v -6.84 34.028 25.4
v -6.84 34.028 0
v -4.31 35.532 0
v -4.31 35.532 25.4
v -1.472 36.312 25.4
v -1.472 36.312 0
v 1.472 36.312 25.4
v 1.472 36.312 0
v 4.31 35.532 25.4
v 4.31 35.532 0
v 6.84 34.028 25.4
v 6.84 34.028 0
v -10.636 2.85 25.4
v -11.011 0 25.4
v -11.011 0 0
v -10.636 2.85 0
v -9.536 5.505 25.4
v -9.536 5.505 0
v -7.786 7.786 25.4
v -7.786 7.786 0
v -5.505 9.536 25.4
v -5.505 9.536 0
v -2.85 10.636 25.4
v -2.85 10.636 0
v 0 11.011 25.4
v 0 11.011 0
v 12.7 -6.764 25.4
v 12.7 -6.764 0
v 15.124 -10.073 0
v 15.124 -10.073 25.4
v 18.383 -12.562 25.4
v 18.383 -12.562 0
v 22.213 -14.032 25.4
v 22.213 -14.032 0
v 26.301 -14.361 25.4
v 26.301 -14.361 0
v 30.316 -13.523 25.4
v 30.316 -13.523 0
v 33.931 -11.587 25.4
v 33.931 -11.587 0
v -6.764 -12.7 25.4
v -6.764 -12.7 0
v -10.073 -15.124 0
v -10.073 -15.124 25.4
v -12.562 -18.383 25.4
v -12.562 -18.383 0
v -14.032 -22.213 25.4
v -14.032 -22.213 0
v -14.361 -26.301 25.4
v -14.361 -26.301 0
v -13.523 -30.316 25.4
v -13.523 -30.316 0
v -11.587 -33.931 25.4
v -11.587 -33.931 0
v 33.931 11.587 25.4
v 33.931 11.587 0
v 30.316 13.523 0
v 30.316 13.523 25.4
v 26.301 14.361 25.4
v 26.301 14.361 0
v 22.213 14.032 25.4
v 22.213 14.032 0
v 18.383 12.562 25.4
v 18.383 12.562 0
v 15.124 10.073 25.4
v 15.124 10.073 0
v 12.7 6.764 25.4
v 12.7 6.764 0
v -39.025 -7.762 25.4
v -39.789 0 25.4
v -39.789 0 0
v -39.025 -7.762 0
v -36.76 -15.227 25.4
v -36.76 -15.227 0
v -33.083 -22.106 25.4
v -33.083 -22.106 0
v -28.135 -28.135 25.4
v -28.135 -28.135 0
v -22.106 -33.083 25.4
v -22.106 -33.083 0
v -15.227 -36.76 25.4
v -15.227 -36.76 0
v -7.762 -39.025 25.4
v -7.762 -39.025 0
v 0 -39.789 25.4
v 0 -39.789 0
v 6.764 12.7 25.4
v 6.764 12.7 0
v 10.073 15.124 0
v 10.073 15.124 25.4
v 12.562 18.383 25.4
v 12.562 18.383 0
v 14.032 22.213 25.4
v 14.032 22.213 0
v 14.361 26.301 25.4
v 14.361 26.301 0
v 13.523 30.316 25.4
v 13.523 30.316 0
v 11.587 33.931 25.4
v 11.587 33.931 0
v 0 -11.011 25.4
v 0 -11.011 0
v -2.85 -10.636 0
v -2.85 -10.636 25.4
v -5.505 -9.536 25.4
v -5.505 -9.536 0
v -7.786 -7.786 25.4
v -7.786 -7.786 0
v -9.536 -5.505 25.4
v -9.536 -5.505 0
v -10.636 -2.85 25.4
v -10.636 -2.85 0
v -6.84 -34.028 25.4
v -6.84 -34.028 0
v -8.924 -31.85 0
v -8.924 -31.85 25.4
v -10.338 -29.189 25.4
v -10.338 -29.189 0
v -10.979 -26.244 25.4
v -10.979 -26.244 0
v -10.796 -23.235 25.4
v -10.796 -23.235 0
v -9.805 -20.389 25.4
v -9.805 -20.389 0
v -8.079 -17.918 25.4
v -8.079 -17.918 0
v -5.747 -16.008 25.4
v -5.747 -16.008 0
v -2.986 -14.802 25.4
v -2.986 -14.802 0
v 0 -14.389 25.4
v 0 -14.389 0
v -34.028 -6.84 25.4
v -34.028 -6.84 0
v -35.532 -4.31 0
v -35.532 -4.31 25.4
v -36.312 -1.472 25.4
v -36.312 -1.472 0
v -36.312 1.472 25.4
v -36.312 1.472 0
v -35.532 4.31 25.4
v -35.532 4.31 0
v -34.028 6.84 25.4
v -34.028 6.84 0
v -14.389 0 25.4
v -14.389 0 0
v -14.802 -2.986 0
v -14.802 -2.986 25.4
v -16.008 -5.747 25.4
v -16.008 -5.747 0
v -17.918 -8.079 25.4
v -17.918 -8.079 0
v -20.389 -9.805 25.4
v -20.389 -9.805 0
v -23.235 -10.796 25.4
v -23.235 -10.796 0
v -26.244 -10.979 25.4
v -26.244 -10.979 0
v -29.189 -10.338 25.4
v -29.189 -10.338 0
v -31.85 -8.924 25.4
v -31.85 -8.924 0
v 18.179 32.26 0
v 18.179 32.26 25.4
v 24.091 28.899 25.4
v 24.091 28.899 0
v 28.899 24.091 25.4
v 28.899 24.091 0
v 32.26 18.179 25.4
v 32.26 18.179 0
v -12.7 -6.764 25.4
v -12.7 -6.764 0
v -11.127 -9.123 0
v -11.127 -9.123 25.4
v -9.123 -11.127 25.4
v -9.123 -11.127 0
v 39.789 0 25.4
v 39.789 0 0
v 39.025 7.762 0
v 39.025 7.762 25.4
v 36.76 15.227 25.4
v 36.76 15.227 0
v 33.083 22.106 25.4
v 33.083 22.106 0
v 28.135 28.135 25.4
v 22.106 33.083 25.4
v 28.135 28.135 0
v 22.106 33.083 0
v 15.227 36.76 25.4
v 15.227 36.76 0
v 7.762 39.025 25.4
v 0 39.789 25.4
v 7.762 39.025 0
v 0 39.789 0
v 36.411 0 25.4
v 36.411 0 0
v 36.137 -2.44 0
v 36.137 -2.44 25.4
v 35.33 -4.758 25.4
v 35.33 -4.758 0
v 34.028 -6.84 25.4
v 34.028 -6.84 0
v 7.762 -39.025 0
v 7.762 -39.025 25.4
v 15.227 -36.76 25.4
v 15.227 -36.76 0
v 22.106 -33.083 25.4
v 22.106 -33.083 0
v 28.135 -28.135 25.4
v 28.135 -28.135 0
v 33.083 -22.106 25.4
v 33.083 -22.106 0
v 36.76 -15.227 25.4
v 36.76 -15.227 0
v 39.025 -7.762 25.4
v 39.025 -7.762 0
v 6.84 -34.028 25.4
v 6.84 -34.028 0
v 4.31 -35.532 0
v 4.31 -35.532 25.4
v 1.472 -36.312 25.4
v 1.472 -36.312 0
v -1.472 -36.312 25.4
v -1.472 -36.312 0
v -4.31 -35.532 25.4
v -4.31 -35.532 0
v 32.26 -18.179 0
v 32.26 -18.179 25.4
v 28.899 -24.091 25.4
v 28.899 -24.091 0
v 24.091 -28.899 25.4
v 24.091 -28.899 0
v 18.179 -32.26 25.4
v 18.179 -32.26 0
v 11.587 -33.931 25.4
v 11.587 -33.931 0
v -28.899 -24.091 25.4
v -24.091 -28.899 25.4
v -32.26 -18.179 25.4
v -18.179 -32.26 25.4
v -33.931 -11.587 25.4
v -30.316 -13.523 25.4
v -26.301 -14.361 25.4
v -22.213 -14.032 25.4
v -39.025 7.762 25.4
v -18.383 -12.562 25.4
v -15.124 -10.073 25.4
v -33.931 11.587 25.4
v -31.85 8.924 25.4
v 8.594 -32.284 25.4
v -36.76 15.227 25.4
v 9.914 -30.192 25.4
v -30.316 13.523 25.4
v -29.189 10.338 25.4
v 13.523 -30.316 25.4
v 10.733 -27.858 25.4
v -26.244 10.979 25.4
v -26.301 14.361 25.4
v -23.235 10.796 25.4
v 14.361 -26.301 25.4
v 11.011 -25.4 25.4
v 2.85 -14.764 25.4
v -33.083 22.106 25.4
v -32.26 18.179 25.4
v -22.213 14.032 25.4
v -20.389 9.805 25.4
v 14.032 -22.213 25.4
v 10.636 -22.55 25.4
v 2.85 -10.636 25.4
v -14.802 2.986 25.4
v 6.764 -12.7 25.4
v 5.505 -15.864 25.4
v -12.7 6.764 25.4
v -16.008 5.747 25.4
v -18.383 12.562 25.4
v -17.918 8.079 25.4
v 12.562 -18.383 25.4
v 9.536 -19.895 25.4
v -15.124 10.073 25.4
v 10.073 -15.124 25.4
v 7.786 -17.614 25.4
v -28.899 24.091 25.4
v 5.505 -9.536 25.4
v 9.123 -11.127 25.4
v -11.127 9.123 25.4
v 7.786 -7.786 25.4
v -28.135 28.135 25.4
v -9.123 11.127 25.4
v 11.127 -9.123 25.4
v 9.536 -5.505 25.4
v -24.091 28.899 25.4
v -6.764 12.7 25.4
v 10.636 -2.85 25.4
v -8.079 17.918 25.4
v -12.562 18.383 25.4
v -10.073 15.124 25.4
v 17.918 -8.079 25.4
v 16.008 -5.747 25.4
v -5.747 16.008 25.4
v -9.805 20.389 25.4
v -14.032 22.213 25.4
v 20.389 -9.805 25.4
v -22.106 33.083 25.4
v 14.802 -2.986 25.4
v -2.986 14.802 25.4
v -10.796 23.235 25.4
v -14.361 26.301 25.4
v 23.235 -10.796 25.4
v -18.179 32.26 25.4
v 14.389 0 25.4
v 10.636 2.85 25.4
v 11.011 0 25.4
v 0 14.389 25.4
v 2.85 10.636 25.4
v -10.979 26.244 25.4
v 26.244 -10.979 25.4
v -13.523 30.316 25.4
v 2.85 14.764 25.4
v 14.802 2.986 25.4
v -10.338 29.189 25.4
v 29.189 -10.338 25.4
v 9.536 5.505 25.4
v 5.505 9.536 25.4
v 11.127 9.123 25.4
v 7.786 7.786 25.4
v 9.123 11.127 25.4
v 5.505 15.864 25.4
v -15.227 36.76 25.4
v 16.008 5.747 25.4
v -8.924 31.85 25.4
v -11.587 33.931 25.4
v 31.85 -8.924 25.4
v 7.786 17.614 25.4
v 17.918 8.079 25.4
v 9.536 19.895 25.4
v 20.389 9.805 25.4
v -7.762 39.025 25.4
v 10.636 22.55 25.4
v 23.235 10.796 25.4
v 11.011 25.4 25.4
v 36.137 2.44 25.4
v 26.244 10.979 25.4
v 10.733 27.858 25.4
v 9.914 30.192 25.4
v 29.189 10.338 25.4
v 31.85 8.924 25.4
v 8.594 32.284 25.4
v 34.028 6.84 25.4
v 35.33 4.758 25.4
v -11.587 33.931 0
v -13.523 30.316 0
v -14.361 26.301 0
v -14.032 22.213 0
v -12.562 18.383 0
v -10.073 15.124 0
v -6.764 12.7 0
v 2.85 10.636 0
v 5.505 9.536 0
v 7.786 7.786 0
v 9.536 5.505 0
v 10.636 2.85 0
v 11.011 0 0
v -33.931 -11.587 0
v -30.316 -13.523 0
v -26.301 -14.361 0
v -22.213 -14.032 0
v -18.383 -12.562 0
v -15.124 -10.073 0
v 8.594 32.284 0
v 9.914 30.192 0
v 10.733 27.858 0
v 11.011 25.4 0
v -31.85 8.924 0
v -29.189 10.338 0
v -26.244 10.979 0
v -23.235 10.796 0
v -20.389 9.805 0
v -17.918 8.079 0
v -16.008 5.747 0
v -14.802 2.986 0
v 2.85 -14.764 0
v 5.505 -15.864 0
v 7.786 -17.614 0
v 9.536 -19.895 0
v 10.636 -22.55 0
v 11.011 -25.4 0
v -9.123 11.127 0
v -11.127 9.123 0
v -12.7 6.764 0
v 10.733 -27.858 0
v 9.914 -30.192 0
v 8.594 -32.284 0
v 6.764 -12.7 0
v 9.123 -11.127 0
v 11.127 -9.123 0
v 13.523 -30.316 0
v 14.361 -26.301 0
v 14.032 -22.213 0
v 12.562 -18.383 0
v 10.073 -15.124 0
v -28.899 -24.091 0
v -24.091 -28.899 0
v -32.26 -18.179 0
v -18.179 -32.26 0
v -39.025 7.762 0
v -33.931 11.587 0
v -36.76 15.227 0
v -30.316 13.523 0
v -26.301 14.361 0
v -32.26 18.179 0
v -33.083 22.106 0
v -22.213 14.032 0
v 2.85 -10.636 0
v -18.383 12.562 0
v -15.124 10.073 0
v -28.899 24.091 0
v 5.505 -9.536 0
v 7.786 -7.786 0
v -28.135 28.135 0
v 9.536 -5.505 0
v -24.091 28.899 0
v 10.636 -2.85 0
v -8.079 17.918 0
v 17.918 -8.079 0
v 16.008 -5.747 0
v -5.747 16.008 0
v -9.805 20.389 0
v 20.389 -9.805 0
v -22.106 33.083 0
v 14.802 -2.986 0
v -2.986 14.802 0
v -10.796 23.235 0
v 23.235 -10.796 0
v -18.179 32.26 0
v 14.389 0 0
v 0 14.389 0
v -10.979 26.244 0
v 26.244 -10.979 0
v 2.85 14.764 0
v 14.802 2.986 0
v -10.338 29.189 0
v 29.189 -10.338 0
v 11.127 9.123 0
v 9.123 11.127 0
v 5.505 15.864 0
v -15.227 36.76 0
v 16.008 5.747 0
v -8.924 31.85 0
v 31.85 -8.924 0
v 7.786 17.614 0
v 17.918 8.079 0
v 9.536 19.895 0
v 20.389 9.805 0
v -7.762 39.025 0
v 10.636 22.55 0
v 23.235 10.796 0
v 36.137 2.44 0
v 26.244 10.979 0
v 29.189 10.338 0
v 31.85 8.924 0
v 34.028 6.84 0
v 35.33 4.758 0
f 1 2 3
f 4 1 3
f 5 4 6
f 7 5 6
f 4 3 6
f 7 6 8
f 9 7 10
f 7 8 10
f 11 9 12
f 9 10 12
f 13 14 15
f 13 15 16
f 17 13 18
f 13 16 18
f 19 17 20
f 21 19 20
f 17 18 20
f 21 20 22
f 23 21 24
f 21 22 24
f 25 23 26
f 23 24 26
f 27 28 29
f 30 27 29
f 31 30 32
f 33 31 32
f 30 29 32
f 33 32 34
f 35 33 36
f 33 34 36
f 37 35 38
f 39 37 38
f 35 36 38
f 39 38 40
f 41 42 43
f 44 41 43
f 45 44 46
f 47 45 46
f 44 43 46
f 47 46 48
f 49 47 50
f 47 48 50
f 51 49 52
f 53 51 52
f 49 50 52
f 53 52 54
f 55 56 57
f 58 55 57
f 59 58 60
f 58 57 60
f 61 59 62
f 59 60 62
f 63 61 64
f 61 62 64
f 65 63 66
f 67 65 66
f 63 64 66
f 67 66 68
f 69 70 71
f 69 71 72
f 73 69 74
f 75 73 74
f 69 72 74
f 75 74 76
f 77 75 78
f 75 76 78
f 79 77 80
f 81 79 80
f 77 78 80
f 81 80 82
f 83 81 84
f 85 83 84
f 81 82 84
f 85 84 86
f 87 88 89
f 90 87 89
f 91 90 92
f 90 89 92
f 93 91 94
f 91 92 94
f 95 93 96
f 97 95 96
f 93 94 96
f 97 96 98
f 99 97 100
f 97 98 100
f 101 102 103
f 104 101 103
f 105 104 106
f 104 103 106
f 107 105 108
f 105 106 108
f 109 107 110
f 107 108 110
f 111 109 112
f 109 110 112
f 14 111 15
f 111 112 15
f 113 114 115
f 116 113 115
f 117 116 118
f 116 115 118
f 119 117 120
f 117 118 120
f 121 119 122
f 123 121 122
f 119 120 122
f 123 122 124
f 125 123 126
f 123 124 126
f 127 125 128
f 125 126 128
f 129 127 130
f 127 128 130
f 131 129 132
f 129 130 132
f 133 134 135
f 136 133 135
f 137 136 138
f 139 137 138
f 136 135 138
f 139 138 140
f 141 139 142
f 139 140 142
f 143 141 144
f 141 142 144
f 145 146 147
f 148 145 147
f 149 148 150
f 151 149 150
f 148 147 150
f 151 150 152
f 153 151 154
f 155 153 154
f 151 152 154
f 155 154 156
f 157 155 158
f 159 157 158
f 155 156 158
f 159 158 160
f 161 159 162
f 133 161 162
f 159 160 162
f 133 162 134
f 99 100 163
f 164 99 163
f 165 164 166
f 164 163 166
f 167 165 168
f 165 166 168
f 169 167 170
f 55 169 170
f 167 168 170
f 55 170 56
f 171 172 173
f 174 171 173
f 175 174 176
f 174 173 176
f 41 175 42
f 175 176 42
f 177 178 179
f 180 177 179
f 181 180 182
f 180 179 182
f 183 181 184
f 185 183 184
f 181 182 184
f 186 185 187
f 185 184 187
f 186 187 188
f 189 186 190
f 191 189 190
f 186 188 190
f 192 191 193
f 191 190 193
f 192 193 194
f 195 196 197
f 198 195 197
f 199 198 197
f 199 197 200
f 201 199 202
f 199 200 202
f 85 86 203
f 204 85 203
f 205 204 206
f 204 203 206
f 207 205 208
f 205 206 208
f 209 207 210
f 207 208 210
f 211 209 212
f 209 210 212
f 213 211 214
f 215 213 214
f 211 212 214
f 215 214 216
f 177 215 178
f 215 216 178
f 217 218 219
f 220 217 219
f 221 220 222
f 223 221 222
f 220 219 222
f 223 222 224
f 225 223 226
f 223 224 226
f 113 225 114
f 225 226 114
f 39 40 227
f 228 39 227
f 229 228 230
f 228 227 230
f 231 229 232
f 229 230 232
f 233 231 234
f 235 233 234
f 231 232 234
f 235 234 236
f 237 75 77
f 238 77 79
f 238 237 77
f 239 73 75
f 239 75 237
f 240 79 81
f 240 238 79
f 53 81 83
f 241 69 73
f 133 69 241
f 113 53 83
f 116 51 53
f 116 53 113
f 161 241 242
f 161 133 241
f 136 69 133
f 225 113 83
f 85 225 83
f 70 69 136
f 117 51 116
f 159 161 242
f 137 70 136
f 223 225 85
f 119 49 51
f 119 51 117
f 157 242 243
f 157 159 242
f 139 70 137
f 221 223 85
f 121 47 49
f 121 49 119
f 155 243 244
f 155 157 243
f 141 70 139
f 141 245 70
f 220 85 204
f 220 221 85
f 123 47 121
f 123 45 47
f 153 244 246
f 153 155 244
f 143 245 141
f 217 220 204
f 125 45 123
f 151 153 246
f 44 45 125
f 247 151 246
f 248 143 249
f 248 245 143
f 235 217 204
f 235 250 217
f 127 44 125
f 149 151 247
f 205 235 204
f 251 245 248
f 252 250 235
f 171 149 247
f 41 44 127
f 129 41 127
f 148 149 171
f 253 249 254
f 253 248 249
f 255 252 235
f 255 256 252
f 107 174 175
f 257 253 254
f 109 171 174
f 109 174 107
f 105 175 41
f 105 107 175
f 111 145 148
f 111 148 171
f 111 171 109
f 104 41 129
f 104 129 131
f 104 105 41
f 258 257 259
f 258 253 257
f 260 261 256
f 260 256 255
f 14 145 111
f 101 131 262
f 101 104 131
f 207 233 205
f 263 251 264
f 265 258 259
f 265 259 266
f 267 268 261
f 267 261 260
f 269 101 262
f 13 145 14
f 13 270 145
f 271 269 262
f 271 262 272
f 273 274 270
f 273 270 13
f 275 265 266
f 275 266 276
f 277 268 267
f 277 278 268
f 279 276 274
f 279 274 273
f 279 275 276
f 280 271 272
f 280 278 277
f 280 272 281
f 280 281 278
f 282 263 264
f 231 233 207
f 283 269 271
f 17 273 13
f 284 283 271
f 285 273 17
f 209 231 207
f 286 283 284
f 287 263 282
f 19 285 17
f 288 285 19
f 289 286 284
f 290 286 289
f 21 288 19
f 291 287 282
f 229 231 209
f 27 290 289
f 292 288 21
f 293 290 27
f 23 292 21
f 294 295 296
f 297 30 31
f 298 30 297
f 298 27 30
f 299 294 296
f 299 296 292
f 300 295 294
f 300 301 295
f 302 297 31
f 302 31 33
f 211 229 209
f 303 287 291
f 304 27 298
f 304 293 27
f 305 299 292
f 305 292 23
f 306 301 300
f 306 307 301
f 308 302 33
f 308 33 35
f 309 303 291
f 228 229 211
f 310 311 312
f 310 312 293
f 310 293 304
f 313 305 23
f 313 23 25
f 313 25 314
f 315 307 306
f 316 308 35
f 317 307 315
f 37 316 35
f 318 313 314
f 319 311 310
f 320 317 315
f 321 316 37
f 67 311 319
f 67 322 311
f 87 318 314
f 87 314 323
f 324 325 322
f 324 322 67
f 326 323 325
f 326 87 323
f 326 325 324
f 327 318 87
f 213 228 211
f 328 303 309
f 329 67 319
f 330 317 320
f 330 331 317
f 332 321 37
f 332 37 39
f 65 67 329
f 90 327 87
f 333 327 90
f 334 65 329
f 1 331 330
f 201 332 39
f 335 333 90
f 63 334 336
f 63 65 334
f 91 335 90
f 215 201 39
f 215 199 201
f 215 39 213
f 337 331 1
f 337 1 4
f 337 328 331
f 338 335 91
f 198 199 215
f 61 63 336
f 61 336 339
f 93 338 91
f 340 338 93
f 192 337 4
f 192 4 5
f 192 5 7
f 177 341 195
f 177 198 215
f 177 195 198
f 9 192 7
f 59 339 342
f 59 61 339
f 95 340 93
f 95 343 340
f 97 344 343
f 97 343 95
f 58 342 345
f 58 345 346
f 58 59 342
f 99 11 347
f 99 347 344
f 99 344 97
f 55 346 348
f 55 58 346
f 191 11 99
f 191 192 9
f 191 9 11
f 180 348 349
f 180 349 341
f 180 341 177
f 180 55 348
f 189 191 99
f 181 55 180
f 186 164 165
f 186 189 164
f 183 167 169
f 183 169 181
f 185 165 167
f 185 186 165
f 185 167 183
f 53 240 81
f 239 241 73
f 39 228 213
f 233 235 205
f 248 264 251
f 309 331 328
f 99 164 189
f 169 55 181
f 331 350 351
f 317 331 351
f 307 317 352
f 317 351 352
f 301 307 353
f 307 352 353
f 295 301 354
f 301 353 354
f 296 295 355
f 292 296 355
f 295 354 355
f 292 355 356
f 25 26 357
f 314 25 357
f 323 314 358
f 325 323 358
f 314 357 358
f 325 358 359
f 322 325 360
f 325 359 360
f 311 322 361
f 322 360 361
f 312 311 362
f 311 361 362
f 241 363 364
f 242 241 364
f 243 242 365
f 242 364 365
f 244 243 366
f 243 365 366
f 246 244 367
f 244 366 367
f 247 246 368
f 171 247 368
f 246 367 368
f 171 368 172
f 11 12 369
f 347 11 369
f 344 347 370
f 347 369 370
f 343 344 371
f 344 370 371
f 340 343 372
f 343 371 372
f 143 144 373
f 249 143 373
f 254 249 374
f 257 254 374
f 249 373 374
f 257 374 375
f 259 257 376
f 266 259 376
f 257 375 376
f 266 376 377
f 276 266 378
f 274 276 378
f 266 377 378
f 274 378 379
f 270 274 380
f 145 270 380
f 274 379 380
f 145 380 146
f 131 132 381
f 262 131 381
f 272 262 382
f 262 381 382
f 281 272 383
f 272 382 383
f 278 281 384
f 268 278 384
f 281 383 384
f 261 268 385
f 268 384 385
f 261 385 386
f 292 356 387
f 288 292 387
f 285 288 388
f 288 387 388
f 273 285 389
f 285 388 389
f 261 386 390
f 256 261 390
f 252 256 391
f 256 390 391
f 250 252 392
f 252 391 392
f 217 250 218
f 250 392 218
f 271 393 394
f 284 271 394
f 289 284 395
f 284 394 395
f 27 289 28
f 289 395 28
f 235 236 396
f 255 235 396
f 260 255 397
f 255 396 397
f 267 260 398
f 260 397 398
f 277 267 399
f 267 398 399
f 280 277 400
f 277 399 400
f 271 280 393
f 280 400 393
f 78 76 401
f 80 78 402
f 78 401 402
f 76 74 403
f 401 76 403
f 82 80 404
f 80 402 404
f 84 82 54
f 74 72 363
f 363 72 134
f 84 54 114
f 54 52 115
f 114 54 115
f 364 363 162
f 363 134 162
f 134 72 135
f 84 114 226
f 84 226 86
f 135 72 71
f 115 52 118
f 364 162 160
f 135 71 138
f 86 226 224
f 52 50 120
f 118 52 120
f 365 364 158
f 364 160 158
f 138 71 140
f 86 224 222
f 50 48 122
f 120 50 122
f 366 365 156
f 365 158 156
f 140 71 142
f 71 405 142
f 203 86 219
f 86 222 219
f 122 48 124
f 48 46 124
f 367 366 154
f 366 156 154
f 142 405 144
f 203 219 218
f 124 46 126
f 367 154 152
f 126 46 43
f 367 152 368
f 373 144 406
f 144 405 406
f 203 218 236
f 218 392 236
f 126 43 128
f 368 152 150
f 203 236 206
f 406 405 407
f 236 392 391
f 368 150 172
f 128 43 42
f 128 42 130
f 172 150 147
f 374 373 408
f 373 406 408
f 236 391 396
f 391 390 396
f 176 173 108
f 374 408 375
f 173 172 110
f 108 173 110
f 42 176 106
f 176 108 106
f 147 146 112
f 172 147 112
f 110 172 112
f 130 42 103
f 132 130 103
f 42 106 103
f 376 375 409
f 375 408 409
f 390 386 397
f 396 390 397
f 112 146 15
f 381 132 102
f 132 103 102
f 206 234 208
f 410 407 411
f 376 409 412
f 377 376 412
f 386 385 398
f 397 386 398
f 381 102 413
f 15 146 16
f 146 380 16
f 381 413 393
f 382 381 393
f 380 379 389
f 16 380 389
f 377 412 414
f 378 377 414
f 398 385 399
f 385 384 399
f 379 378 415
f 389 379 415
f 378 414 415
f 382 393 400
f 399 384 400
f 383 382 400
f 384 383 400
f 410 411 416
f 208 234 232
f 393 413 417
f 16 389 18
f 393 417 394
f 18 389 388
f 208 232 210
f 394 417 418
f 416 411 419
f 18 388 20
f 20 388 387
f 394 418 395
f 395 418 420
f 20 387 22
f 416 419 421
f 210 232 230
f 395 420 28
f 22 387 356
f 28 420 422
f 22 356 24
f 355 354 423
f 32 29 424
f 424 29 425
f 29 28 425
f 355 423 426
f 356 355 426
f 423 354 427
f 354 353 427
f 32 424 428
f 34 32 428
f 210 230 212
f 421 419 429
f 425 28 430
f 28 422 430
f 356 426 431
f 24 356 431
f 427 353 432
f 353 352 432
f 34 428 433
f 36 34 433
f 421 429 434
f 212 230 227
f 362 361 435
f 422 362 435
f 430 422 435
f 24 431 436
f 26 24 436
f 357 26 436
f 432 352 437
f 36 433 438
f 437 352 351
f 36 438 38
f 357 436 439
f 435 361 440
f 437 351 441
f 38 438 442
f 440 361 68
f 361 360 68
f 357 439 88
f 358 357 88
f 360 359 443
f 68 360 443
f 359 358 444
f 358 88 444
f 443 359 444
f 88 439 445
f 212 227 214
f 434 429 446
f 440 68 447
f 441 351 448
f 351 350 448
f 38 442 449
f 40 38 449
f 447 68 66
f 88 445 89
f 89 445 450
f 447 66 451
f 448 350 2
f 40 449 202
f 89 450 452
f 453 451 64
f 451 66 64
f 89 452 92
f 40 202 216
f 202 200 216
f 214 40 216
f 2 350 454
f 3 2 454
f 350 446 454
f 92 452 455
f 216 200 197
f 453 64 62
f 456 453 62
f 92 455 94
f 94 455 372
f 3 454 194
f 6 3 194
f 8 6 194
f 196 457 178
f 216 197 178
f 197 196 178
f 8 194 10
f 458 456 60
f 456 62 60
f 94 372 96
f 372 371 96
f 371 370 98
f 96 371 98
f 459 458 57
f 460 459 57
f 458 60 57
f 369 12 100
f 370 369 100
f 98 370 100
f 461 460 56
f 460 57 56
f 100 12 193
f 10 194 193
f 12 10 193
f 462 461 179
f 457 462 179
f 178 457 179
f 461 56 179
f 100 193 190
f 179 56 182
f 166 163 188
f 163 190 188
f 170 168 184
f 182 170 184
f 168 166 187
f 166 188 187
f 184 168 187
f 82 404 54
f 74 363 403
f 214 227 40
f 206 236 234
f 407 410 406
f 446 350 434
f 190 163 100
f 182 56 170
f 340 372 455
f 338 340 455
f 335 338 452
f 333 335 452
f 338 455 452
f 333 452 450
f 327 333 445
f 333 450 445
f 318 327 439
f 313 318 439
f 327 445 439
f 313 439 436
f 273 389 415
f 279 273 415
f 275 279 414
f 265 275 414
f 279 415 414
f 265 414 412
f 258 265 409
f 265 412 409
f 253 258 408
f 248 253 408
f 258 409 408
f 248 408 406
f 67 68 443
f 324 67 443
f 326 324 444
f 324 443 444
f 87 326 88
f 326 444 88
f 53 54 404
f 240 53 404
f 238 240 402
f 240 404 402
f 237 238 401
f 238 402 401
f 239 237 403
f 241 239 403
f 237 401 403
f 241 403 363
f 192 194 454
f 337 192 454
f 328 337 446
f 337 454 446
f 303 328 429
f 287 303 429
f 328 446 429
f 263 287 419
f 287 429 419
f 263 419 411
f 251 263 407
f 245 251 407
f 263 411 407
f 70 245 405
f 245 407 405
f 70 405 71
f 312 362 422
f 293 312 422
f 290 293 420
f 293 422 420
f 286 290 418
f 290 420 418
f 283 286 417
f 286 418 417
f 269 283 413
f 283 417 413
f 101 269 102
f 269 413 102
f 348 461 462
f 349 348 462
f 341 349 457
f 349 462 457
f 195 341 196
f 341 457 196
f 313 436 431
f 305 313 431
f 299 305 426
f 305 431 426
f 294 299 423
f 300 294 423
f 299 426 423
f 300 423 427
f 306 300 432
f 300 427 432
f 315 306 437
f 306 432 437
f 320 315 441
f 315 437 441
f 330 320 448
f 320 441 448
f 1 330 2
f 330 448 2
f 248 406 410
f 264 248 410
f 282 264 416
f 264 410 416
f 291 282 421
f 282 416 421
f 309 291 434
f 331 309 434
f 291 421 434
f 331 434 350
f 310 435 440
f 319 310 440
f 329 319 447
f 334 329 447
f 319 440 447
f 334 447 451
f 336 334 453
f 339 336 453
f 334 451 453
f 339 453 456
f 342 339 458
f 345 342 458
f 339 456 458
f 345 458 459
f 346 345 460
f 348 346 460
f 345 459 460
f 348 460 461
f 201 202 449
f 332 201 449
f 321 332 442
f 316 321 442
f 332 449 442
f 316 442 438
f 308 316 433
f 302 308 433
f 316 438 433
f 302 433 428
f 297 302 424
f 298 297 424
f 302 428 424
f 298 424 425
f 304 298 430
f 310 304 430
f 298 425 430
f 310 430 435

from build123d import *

# Parameters (mm, degrees)
F1_DEPTH = 25.4


# Not quite as in the source:
# - a feature names something its author has since deleted; it is built from what else it names


with BuildPart() as f1:
    # F0 (on Top) → F1 (new body)
    with BuildSketch(Plane.XY):
        with BuildLine():
            ThreePointArc((12.7, -6.7643328429), (11.4395600211, -3.4860169829), (11.0109, 0))
            ThreePointArc((11.0109, 0), (7.785882057, -7.785882057), (0, -11.0109))
            ThreePointArc((0, -11.0109), (3.4860169829, -11.4395600211), (6.7643328429, -12.7))
            ThreePointArc((6.7643328429, -12.7), (10.1746301852, -10.1746301852), (12.7, -6.7643328429))
        make_face()
        with BuildLine():
            ThreePointArc((-11.0109, 0), (-7.785882056, 7.7858820579), (2.7e-09, 11.0109))
            ThreePointArc((2.7e-09, 11.0109), (-3.4860169816, 11.4395600208), (-6.7643328429, 12.7))
            ThreePointArc((-6.7643328429, 12.7), (-10.1746301852, 10.1746301852), (-12.7, 6.7643328429))
            ThreePointArc((-12.7, 6.7643328429), (-11.4395600211, 3.4860169829), (-11.0109, 0))
        make_face()
        with BuildLine():
            ThreePointArc((6.7643328429, 12.7), (3.4860169842, 11.4395600214), (2.7e-09, 11.0109))
            ThreePointArc((2.7e-09, 11.0109), (7.7858820579, 7.785882056), (11.0109, 0))
            ThreePointArc((11.0109, 0), (11.4395600211, 3.4860169829), (12.7, 6.7643328429))
            ThreePointArc((12.7, 6.7643328429), (10.1746301852, 10.1746301852), (6.7643328429, 12.7))
        make_face()
        with BuildLine():
            ThreePointArc((0, -11.0109), (-7.785882057, -7.785882057), (-11.0109, 0))
            ThreePointArc((-11.0109, 0), (-11.4395600211, -3.4860169829), (-12.7, -6.7643328429))
            ThreePointArc((-12.7, -6.7643328429), (-10.1746301852, -10.1746301852), (-6.7643328429, -12.7))
            ThreePointArc((-6.7643328429, -12.7), (-3.4860169829, -11.4395600211), (0, -11.0109))
        make_face()
        with BuildLine():
            ThreePointArc((-6.8403930724, 34.02838), (0, 36.4109), (6.8403930724, 34.02838))
            ThreePointArc((6.8403930724, 34.02838), (9.216102766, 34.090951688), (11.5872617117, 33.9312112173))
            ThreePointArc((11.5872617117, 33.9312112173), (6.4919083282, 38.2413910878), (0, 39.7891))
            ThreePointArc((0, 39.7891), (-6.4919083282, 38.2413910878), (-11.5872617117, 33.9312112173))
            ThreePointArc((-11.5872617117, 33.9312112173), (-9.216102766, 34.090951688), (-6.8403930724, 34.02838))
        make_face()
        with BuildLine():
            ThreePointArc((0, 39.7891), (6.4919083282, 38.2413910878), (11.5872617117, 33.9312112173))
            ThreePointArc((11.5872617117, 33.9312112173), (26.6567838655, 26.6567838655), (33.9312112173, 11.5872617117))
            ThreePointArc((33.9312112173, 11.5872617117), (38.2413910878, 6.4919083282), (39.7891, 0))
            ThreePointArc((39.7891, 0), (28.1351424273, 28.1351424273), (0, 39.7891))
        make_face()
        with BuildLine():
            ThreePointArc((6.8403930724, 34.02838), (9.9135967966, 30.1917134059), (11.0109, 25.4))
            ThreePointArc((11.0109, 25.4), (7.7858820586, 17.6141179447), (4.7e-09, 14.3891))
            ThreePointArc((4.7e-09, 14.3891), (3.4860169852, 13.9604399783), (6.7643328429, 12.7))
            ThreePointArc((6.7643328429, 12.7), (12.3365080254, 17.9934644705), (14.3891, 25.4))
            ThreePointArc((14.3891, 25.4), (13.6707071197, 29.8897623163), (11.5872617117, 33.9312112173))
            ThreePointArc((11.5872617117, 33.9312112173), (9.216102766, 34.090951688), (6.8403930724, 34.02838))
        make_face()
        with BuildLine():
            ThreePointArc((-6.7643328429, 12.7), (-3.4860169806, 13.9604399795), (4.7e-09, 14.3891))
            ThreePointArc((4.7e-09, 14.3891), (-10.3982245629, 21.7782815197), (-6.8403930724, 34.02838))
            ThreePointArc((-6.8403930724, 34.02838), (-9.216102766, 34.090951688), (-11.5872617117, 33.9312112173))
            ThreePointArc((-11.5872617117, 33.9312112173), (-14.0316192263, 22.2125463616), (-6.7643328429, 12.7))
        make_face()
        with BuildLine():
            ThreePointArc((-33.9312112173, 11.5872617117), (-26.6567838655, 26.6567838655), (-11.5872617117, 33.9312112173))
            ThreePointArc((-11.5872617117, 33.9312112173), (-6.4919083282, 38.2413910878), (0, 39.7891))
            ThreePointArc((0, 39.7891), (-28.1351424273, 28.1351424273), (-39.7891, 0))
            ThreePointArc((-39.7891, 0), (-38.2413910878, 6.4919083282), (-33.9312112173, 11.5872617117))
        make_face()
        with BuildLine():
            ThreePointArc((-34.02838, 6.8403930724), (-34.090951688, 9.216102766), (-33.9312112173, 11.5872617117))
            ThreePointArc((-33.9312112173, 11.5872617117), (-38.2413910878, 6.4919083282), (-39.7891, 0))
            ThreePointArc((-39.7891, 0), (-38.2413910878, -6.4919083282), (-33.9312112173, -11.5872617117))
            ThreePointArc((-33.9312112173, -11.5872617117), (-34.090951688, -9.216102766), (-34.02838, -6.8403930724))
            ThreePointArc((-34.02838, -6.8403930724), (-36.4109, 0), (-34.02838, 6.8403930724))
        make_face()
        with BuildLine():
            ThreePointArc((-12.7, -6.7643328429), (-13.9604399789, -3.4860169829), (-14.3891, 0))
            ThreePointArc((-14.3891, 0), (-21.778281522, -10.3982245636), (-34.02838, -6.8403930724))
            ThreePointArc((-34.02838, -6.8403930724), (-34.090951688, -9.216102766), (-33.9312112173, -11.5872617117))
            ThreePointArc((-33.9312112173, -11.5872617117), (-22.2125463616, -14.0316192263), (-12.7, -6.7643328429))
        make_face()
        with BuildLine():
            ThreePointArc((-33.9312112173, -11.5872617117), (-38.2413910878, -6.4919083282), (-39.7891, 0))
            ThreePointArc((-39.7891, 0), (-28.1351424844, -28.1351423702), (-1.615e-07, -39.7891))
            ThreePointArc((-1.615e-07, -39.7891), (-6.4919084002, -38.2413910513), (-11.5872617117, -33.9312112173))
            ThreePointArc((-11.5872617117, -33.9312112173), (-26.6567838655, -26.6567838655), (-33.9312112173, -11.5872617117))
        make_face()
        with BuildLine():
            ThreePointArc((-6.8403930724, -34.02838), (-10.3982245667, -21.7782815309), (-1.89e-08, -14.3891))
            ThreePointArc((-1.89e-08, -14.3891), (-3.486016992, -13.9604399766), (-6.7643328429, -12.7))
            ThreePointArc((-6.7643328429, -12.7), (-14.0316192263, -22.2125463616), (-11.5872617117, -33.9312112173))
            ThreePointArc((-11.5872617117, -33.9312112173), (-9.216102766, -34.090951688), (-6.8403930724, -34.02838))
        make_face()
        with BuildLine():
            ThreePointArc((-11.5872617117, -33.9312112173), (-6.4919084002, -38.2413910513), (-1.615e-07, -39.7891))
            ThreePointArc((-1.615e-07, -39.7891), (6.4919082561, -38.2413911242), (11.5872617117, -33.9312112173))
            ThreePointArc((11.5872617117, -33.9312112173), (9.216102766, -34.090951688), (6.8403930724, -34.02838))
            ThreePointArc((6.8403930724, -34.02838), (0, -36.4109), (-6.8403930724, -34.02838))
            ThreePointArc((-6.8403930724, -34.02838), (-9.216102766, -34.090951688), (-11.5872617117, -33.9312112173))
        make_face()
        with BuildLine():
            ThreePointArc((6.7643328429, -12.7), (3.4860169737, -13.9604399812), (-1.89e-08, -14.3891))
            ThreePointArc((-1.89e-08, -14.3891), (7.7858820503, -17.6141179364), (11.0109, -25.4))
            ThreePointArc((11.0109, -25.4), (9.9135967966, -30.1917134059), (6.8403930724, -34.02838))
            ThreePointArc((6.8403930724, -34.02838), (9.216102766, -34.090951688), (11.5872617117, -33.9312112173))
            ThreePointArc((11.5872617117, -33.9312112173), (13.6707071197, -29.8897623163), (14.3891, -25.4))
            ThreePointArc((14.3891, -25.4), (12.3365080254, -17.9934644705), (6.7643328429, -12.7))
        make_face()
        with BuildLine():
            ThreePointArc((-1.615e-07, -39.7891), (28.1351423702, -28.1351424844), (39.7891, 0))
            ThreePointArc((39.7891, 0), (38.2413910878, -6.4919083282), (33.9312112173, -11.5872617117))
            ThreePointArc((33.9312112173, -11.5872617117), (26.6567838655, -26.6567838655), (11.5872617117, -33.9312112173))
            ThreePointArc((11.5872617117, -33.9312112173), (6.4919082561, -38.2413911242), (-1.615e-07, -39.7891))
        make_face()
        with BuildLine():
            ThreePointArc((39.7891, 0), (38.2413910878, 6.4919083282), (33.9312112173, 11.5872617117))
            ThreePointArc((33.9312112173, 11.5872617117), (34.090951688, 9.216102766), (34.02838, 6.8403930724))
            ThreePointArc((34.02838, 6.8403930724), (35.7982245636, 3.621718478), (36.4109, 0))
            ThreePointArc((36.4109, 0), (35.7982245636, -3.621718478), (34.02838, -6.8403930724))
            ThreePointArc((34.02838, -6.8403930724), (34.090951688, -9.216102766), (33.9312112173, -11.5872617117))
            ThreePointArc((33.9312112173, -11.5872617117), (38.2413910878, -6.4919083282), (39.7891, 0))
        make_face()
        with BuildLine():
            ThreePointArc((34.02838, 6.8403930724), (34.090951688, 9.216102766), (33.9312112173, 11.5872617117))
            ThreePointArc((33.9312112173, 11.5872617117), (22.2125463616, 14.0316192263), (12.7, 6.7643328429))
            ThreePointArc((12.7, 6.7643328429), (13.9604399789, 3.4860169829), (14.3891, 0))
            ThreePointArc((14.3891, 0), (21.778281522, 10.3982245636), (34.02838, 6.8403930724))
        make_face()
        with BuildLine():
            ThreePointArc((12.7, 6.7643328429), (11.4395600211, 3.4860169829), (11.0109, 0))
            Line((11.0109, 0), (14.3891, 0))
            ThreePointArc((14.3891, 0), (13.9604399789, 3.4860169829), (12.7, 6.7643328429))
        make_face()
        with BuildLine():
            Line((14.3891, 0), (11.0109, 0))
            ThreePointArc((11.0109, 0), (11.4395600211, -3.4860169829), (12.7, -6.7643328429))
            ThreePointArc((12.7, -6.7643328429), (13.9604399789, -3.4860169829), (14.3891, 0))
        make_face()
        with BuildLine():
            ThreePointArc((34.02838, -6.8403930724), (21.778281522, -10.3982245636), (14.3891, 0))
            ThreePointArc((14.3891, 0), (13.9604399789, -3.4860169829), (12.7, -6.7643328429))
            ThreePointArc((12.7, -6.7643328429), (22.2125463616, -14.0316192263), (33.9312112173, -11.5872617117))
            ThreePointArc((33.9312112173, -11.5872617117), (34.090951688, -9.216102766), (34.02838, -6.8403930724))
        make_face()
        with BuildLine():
            ThreePointArc((6.7643328429, -12.7), (3.4860169829, -11.4395600211), (0, -11.0109))
            Line((0, -11.0109), (0, -14.3891))
            ThreePointArc((-1.89e-08, -14.3891), (3.4860169737, -13.9604399812), (6.7643328429, -12.7))
        make_face()
        with BuildLine():
            Line((0, -14.3891), (0, -11.0109))
            ThreePointArc((0, -11.0109), (-3.4860169829, -11.4395600211), (-6.7643328429, -12.7))
            ThreePointArc((-6.7643328429, -12.7), (-3.486016992, -13.9604399766), (-1.89e-08, -14.3891))
        make_face()
        with BuildLine():
            ThreePointArc((-12.7, -6.7643328429), (-11.4395600211, -3.4860169829), (-11.0109, 0))
            Line((-11.0109, 0), (-14.3891, 0))
            ThreePointArc((-14.3891, 0), (-13.9604399789, -3.4860169829), (-12.7, -6.7643328429))
        make_face()
        with BuildLine():
            Line((-14.3891, 0), (-11.0109, 0))
            ThreePointArc((-11.0109, 0), (-11.4395600211, 3.4860169829), (-12.7, 6.7643328429))
            ThreePointArc((-12.7, 6.7643328429), (-13.9604399789, 3.4860169829), (-14.3891, 0))
        make_face()
        with BuildLine():
            Line((0, 11.0109), (0, 14.3891))
            ThreePointArc((4.7e-09, 14.3891), (-3.4860169806, 13.9604399795), (-6.7643328429, 12.7))
            ThreePointArc((-6.7643328429, 12.7), (-3.4860169816, 11.4395600208), (2.7e-09, 11.0109))
        make_face()
        with BuildLine():
            ThreePointArc((6.7643328429, 12.7), (3.4860169852, 13.9604399783), (4.7e-09, 14.3891))
            Line((0, 14.3891), (0, 11.0109))
            ThreePointArc((2.7e-09, 11.0109), (3.4860169842, 11.4395600214), (6.7643328429, 12.7))
        make_face()
        with BuildLine():
            ThreePointArc((-14.3891, 0), (-13.9604399789, 3.4860169829), (-12.7, 6.7643328429))
            ThreePointArc((-12.7, 6.7643328429), (-22.2125463616, 14.0316192263), (-33.9312112173, 11.5872617117))
            ThreePointArc((-33.9312112173, 11.5872617117), (-34.090951688, 9.216102766), (-34.02838, 6.8403930724))
            ThreePointArc((-34.02838, 6.8403930724), (-21.778281522, 10.3982245636), (-14.3891, 0))
        make_face()
    extrude(amount=F1_DEPTH)


solid = f1.part
